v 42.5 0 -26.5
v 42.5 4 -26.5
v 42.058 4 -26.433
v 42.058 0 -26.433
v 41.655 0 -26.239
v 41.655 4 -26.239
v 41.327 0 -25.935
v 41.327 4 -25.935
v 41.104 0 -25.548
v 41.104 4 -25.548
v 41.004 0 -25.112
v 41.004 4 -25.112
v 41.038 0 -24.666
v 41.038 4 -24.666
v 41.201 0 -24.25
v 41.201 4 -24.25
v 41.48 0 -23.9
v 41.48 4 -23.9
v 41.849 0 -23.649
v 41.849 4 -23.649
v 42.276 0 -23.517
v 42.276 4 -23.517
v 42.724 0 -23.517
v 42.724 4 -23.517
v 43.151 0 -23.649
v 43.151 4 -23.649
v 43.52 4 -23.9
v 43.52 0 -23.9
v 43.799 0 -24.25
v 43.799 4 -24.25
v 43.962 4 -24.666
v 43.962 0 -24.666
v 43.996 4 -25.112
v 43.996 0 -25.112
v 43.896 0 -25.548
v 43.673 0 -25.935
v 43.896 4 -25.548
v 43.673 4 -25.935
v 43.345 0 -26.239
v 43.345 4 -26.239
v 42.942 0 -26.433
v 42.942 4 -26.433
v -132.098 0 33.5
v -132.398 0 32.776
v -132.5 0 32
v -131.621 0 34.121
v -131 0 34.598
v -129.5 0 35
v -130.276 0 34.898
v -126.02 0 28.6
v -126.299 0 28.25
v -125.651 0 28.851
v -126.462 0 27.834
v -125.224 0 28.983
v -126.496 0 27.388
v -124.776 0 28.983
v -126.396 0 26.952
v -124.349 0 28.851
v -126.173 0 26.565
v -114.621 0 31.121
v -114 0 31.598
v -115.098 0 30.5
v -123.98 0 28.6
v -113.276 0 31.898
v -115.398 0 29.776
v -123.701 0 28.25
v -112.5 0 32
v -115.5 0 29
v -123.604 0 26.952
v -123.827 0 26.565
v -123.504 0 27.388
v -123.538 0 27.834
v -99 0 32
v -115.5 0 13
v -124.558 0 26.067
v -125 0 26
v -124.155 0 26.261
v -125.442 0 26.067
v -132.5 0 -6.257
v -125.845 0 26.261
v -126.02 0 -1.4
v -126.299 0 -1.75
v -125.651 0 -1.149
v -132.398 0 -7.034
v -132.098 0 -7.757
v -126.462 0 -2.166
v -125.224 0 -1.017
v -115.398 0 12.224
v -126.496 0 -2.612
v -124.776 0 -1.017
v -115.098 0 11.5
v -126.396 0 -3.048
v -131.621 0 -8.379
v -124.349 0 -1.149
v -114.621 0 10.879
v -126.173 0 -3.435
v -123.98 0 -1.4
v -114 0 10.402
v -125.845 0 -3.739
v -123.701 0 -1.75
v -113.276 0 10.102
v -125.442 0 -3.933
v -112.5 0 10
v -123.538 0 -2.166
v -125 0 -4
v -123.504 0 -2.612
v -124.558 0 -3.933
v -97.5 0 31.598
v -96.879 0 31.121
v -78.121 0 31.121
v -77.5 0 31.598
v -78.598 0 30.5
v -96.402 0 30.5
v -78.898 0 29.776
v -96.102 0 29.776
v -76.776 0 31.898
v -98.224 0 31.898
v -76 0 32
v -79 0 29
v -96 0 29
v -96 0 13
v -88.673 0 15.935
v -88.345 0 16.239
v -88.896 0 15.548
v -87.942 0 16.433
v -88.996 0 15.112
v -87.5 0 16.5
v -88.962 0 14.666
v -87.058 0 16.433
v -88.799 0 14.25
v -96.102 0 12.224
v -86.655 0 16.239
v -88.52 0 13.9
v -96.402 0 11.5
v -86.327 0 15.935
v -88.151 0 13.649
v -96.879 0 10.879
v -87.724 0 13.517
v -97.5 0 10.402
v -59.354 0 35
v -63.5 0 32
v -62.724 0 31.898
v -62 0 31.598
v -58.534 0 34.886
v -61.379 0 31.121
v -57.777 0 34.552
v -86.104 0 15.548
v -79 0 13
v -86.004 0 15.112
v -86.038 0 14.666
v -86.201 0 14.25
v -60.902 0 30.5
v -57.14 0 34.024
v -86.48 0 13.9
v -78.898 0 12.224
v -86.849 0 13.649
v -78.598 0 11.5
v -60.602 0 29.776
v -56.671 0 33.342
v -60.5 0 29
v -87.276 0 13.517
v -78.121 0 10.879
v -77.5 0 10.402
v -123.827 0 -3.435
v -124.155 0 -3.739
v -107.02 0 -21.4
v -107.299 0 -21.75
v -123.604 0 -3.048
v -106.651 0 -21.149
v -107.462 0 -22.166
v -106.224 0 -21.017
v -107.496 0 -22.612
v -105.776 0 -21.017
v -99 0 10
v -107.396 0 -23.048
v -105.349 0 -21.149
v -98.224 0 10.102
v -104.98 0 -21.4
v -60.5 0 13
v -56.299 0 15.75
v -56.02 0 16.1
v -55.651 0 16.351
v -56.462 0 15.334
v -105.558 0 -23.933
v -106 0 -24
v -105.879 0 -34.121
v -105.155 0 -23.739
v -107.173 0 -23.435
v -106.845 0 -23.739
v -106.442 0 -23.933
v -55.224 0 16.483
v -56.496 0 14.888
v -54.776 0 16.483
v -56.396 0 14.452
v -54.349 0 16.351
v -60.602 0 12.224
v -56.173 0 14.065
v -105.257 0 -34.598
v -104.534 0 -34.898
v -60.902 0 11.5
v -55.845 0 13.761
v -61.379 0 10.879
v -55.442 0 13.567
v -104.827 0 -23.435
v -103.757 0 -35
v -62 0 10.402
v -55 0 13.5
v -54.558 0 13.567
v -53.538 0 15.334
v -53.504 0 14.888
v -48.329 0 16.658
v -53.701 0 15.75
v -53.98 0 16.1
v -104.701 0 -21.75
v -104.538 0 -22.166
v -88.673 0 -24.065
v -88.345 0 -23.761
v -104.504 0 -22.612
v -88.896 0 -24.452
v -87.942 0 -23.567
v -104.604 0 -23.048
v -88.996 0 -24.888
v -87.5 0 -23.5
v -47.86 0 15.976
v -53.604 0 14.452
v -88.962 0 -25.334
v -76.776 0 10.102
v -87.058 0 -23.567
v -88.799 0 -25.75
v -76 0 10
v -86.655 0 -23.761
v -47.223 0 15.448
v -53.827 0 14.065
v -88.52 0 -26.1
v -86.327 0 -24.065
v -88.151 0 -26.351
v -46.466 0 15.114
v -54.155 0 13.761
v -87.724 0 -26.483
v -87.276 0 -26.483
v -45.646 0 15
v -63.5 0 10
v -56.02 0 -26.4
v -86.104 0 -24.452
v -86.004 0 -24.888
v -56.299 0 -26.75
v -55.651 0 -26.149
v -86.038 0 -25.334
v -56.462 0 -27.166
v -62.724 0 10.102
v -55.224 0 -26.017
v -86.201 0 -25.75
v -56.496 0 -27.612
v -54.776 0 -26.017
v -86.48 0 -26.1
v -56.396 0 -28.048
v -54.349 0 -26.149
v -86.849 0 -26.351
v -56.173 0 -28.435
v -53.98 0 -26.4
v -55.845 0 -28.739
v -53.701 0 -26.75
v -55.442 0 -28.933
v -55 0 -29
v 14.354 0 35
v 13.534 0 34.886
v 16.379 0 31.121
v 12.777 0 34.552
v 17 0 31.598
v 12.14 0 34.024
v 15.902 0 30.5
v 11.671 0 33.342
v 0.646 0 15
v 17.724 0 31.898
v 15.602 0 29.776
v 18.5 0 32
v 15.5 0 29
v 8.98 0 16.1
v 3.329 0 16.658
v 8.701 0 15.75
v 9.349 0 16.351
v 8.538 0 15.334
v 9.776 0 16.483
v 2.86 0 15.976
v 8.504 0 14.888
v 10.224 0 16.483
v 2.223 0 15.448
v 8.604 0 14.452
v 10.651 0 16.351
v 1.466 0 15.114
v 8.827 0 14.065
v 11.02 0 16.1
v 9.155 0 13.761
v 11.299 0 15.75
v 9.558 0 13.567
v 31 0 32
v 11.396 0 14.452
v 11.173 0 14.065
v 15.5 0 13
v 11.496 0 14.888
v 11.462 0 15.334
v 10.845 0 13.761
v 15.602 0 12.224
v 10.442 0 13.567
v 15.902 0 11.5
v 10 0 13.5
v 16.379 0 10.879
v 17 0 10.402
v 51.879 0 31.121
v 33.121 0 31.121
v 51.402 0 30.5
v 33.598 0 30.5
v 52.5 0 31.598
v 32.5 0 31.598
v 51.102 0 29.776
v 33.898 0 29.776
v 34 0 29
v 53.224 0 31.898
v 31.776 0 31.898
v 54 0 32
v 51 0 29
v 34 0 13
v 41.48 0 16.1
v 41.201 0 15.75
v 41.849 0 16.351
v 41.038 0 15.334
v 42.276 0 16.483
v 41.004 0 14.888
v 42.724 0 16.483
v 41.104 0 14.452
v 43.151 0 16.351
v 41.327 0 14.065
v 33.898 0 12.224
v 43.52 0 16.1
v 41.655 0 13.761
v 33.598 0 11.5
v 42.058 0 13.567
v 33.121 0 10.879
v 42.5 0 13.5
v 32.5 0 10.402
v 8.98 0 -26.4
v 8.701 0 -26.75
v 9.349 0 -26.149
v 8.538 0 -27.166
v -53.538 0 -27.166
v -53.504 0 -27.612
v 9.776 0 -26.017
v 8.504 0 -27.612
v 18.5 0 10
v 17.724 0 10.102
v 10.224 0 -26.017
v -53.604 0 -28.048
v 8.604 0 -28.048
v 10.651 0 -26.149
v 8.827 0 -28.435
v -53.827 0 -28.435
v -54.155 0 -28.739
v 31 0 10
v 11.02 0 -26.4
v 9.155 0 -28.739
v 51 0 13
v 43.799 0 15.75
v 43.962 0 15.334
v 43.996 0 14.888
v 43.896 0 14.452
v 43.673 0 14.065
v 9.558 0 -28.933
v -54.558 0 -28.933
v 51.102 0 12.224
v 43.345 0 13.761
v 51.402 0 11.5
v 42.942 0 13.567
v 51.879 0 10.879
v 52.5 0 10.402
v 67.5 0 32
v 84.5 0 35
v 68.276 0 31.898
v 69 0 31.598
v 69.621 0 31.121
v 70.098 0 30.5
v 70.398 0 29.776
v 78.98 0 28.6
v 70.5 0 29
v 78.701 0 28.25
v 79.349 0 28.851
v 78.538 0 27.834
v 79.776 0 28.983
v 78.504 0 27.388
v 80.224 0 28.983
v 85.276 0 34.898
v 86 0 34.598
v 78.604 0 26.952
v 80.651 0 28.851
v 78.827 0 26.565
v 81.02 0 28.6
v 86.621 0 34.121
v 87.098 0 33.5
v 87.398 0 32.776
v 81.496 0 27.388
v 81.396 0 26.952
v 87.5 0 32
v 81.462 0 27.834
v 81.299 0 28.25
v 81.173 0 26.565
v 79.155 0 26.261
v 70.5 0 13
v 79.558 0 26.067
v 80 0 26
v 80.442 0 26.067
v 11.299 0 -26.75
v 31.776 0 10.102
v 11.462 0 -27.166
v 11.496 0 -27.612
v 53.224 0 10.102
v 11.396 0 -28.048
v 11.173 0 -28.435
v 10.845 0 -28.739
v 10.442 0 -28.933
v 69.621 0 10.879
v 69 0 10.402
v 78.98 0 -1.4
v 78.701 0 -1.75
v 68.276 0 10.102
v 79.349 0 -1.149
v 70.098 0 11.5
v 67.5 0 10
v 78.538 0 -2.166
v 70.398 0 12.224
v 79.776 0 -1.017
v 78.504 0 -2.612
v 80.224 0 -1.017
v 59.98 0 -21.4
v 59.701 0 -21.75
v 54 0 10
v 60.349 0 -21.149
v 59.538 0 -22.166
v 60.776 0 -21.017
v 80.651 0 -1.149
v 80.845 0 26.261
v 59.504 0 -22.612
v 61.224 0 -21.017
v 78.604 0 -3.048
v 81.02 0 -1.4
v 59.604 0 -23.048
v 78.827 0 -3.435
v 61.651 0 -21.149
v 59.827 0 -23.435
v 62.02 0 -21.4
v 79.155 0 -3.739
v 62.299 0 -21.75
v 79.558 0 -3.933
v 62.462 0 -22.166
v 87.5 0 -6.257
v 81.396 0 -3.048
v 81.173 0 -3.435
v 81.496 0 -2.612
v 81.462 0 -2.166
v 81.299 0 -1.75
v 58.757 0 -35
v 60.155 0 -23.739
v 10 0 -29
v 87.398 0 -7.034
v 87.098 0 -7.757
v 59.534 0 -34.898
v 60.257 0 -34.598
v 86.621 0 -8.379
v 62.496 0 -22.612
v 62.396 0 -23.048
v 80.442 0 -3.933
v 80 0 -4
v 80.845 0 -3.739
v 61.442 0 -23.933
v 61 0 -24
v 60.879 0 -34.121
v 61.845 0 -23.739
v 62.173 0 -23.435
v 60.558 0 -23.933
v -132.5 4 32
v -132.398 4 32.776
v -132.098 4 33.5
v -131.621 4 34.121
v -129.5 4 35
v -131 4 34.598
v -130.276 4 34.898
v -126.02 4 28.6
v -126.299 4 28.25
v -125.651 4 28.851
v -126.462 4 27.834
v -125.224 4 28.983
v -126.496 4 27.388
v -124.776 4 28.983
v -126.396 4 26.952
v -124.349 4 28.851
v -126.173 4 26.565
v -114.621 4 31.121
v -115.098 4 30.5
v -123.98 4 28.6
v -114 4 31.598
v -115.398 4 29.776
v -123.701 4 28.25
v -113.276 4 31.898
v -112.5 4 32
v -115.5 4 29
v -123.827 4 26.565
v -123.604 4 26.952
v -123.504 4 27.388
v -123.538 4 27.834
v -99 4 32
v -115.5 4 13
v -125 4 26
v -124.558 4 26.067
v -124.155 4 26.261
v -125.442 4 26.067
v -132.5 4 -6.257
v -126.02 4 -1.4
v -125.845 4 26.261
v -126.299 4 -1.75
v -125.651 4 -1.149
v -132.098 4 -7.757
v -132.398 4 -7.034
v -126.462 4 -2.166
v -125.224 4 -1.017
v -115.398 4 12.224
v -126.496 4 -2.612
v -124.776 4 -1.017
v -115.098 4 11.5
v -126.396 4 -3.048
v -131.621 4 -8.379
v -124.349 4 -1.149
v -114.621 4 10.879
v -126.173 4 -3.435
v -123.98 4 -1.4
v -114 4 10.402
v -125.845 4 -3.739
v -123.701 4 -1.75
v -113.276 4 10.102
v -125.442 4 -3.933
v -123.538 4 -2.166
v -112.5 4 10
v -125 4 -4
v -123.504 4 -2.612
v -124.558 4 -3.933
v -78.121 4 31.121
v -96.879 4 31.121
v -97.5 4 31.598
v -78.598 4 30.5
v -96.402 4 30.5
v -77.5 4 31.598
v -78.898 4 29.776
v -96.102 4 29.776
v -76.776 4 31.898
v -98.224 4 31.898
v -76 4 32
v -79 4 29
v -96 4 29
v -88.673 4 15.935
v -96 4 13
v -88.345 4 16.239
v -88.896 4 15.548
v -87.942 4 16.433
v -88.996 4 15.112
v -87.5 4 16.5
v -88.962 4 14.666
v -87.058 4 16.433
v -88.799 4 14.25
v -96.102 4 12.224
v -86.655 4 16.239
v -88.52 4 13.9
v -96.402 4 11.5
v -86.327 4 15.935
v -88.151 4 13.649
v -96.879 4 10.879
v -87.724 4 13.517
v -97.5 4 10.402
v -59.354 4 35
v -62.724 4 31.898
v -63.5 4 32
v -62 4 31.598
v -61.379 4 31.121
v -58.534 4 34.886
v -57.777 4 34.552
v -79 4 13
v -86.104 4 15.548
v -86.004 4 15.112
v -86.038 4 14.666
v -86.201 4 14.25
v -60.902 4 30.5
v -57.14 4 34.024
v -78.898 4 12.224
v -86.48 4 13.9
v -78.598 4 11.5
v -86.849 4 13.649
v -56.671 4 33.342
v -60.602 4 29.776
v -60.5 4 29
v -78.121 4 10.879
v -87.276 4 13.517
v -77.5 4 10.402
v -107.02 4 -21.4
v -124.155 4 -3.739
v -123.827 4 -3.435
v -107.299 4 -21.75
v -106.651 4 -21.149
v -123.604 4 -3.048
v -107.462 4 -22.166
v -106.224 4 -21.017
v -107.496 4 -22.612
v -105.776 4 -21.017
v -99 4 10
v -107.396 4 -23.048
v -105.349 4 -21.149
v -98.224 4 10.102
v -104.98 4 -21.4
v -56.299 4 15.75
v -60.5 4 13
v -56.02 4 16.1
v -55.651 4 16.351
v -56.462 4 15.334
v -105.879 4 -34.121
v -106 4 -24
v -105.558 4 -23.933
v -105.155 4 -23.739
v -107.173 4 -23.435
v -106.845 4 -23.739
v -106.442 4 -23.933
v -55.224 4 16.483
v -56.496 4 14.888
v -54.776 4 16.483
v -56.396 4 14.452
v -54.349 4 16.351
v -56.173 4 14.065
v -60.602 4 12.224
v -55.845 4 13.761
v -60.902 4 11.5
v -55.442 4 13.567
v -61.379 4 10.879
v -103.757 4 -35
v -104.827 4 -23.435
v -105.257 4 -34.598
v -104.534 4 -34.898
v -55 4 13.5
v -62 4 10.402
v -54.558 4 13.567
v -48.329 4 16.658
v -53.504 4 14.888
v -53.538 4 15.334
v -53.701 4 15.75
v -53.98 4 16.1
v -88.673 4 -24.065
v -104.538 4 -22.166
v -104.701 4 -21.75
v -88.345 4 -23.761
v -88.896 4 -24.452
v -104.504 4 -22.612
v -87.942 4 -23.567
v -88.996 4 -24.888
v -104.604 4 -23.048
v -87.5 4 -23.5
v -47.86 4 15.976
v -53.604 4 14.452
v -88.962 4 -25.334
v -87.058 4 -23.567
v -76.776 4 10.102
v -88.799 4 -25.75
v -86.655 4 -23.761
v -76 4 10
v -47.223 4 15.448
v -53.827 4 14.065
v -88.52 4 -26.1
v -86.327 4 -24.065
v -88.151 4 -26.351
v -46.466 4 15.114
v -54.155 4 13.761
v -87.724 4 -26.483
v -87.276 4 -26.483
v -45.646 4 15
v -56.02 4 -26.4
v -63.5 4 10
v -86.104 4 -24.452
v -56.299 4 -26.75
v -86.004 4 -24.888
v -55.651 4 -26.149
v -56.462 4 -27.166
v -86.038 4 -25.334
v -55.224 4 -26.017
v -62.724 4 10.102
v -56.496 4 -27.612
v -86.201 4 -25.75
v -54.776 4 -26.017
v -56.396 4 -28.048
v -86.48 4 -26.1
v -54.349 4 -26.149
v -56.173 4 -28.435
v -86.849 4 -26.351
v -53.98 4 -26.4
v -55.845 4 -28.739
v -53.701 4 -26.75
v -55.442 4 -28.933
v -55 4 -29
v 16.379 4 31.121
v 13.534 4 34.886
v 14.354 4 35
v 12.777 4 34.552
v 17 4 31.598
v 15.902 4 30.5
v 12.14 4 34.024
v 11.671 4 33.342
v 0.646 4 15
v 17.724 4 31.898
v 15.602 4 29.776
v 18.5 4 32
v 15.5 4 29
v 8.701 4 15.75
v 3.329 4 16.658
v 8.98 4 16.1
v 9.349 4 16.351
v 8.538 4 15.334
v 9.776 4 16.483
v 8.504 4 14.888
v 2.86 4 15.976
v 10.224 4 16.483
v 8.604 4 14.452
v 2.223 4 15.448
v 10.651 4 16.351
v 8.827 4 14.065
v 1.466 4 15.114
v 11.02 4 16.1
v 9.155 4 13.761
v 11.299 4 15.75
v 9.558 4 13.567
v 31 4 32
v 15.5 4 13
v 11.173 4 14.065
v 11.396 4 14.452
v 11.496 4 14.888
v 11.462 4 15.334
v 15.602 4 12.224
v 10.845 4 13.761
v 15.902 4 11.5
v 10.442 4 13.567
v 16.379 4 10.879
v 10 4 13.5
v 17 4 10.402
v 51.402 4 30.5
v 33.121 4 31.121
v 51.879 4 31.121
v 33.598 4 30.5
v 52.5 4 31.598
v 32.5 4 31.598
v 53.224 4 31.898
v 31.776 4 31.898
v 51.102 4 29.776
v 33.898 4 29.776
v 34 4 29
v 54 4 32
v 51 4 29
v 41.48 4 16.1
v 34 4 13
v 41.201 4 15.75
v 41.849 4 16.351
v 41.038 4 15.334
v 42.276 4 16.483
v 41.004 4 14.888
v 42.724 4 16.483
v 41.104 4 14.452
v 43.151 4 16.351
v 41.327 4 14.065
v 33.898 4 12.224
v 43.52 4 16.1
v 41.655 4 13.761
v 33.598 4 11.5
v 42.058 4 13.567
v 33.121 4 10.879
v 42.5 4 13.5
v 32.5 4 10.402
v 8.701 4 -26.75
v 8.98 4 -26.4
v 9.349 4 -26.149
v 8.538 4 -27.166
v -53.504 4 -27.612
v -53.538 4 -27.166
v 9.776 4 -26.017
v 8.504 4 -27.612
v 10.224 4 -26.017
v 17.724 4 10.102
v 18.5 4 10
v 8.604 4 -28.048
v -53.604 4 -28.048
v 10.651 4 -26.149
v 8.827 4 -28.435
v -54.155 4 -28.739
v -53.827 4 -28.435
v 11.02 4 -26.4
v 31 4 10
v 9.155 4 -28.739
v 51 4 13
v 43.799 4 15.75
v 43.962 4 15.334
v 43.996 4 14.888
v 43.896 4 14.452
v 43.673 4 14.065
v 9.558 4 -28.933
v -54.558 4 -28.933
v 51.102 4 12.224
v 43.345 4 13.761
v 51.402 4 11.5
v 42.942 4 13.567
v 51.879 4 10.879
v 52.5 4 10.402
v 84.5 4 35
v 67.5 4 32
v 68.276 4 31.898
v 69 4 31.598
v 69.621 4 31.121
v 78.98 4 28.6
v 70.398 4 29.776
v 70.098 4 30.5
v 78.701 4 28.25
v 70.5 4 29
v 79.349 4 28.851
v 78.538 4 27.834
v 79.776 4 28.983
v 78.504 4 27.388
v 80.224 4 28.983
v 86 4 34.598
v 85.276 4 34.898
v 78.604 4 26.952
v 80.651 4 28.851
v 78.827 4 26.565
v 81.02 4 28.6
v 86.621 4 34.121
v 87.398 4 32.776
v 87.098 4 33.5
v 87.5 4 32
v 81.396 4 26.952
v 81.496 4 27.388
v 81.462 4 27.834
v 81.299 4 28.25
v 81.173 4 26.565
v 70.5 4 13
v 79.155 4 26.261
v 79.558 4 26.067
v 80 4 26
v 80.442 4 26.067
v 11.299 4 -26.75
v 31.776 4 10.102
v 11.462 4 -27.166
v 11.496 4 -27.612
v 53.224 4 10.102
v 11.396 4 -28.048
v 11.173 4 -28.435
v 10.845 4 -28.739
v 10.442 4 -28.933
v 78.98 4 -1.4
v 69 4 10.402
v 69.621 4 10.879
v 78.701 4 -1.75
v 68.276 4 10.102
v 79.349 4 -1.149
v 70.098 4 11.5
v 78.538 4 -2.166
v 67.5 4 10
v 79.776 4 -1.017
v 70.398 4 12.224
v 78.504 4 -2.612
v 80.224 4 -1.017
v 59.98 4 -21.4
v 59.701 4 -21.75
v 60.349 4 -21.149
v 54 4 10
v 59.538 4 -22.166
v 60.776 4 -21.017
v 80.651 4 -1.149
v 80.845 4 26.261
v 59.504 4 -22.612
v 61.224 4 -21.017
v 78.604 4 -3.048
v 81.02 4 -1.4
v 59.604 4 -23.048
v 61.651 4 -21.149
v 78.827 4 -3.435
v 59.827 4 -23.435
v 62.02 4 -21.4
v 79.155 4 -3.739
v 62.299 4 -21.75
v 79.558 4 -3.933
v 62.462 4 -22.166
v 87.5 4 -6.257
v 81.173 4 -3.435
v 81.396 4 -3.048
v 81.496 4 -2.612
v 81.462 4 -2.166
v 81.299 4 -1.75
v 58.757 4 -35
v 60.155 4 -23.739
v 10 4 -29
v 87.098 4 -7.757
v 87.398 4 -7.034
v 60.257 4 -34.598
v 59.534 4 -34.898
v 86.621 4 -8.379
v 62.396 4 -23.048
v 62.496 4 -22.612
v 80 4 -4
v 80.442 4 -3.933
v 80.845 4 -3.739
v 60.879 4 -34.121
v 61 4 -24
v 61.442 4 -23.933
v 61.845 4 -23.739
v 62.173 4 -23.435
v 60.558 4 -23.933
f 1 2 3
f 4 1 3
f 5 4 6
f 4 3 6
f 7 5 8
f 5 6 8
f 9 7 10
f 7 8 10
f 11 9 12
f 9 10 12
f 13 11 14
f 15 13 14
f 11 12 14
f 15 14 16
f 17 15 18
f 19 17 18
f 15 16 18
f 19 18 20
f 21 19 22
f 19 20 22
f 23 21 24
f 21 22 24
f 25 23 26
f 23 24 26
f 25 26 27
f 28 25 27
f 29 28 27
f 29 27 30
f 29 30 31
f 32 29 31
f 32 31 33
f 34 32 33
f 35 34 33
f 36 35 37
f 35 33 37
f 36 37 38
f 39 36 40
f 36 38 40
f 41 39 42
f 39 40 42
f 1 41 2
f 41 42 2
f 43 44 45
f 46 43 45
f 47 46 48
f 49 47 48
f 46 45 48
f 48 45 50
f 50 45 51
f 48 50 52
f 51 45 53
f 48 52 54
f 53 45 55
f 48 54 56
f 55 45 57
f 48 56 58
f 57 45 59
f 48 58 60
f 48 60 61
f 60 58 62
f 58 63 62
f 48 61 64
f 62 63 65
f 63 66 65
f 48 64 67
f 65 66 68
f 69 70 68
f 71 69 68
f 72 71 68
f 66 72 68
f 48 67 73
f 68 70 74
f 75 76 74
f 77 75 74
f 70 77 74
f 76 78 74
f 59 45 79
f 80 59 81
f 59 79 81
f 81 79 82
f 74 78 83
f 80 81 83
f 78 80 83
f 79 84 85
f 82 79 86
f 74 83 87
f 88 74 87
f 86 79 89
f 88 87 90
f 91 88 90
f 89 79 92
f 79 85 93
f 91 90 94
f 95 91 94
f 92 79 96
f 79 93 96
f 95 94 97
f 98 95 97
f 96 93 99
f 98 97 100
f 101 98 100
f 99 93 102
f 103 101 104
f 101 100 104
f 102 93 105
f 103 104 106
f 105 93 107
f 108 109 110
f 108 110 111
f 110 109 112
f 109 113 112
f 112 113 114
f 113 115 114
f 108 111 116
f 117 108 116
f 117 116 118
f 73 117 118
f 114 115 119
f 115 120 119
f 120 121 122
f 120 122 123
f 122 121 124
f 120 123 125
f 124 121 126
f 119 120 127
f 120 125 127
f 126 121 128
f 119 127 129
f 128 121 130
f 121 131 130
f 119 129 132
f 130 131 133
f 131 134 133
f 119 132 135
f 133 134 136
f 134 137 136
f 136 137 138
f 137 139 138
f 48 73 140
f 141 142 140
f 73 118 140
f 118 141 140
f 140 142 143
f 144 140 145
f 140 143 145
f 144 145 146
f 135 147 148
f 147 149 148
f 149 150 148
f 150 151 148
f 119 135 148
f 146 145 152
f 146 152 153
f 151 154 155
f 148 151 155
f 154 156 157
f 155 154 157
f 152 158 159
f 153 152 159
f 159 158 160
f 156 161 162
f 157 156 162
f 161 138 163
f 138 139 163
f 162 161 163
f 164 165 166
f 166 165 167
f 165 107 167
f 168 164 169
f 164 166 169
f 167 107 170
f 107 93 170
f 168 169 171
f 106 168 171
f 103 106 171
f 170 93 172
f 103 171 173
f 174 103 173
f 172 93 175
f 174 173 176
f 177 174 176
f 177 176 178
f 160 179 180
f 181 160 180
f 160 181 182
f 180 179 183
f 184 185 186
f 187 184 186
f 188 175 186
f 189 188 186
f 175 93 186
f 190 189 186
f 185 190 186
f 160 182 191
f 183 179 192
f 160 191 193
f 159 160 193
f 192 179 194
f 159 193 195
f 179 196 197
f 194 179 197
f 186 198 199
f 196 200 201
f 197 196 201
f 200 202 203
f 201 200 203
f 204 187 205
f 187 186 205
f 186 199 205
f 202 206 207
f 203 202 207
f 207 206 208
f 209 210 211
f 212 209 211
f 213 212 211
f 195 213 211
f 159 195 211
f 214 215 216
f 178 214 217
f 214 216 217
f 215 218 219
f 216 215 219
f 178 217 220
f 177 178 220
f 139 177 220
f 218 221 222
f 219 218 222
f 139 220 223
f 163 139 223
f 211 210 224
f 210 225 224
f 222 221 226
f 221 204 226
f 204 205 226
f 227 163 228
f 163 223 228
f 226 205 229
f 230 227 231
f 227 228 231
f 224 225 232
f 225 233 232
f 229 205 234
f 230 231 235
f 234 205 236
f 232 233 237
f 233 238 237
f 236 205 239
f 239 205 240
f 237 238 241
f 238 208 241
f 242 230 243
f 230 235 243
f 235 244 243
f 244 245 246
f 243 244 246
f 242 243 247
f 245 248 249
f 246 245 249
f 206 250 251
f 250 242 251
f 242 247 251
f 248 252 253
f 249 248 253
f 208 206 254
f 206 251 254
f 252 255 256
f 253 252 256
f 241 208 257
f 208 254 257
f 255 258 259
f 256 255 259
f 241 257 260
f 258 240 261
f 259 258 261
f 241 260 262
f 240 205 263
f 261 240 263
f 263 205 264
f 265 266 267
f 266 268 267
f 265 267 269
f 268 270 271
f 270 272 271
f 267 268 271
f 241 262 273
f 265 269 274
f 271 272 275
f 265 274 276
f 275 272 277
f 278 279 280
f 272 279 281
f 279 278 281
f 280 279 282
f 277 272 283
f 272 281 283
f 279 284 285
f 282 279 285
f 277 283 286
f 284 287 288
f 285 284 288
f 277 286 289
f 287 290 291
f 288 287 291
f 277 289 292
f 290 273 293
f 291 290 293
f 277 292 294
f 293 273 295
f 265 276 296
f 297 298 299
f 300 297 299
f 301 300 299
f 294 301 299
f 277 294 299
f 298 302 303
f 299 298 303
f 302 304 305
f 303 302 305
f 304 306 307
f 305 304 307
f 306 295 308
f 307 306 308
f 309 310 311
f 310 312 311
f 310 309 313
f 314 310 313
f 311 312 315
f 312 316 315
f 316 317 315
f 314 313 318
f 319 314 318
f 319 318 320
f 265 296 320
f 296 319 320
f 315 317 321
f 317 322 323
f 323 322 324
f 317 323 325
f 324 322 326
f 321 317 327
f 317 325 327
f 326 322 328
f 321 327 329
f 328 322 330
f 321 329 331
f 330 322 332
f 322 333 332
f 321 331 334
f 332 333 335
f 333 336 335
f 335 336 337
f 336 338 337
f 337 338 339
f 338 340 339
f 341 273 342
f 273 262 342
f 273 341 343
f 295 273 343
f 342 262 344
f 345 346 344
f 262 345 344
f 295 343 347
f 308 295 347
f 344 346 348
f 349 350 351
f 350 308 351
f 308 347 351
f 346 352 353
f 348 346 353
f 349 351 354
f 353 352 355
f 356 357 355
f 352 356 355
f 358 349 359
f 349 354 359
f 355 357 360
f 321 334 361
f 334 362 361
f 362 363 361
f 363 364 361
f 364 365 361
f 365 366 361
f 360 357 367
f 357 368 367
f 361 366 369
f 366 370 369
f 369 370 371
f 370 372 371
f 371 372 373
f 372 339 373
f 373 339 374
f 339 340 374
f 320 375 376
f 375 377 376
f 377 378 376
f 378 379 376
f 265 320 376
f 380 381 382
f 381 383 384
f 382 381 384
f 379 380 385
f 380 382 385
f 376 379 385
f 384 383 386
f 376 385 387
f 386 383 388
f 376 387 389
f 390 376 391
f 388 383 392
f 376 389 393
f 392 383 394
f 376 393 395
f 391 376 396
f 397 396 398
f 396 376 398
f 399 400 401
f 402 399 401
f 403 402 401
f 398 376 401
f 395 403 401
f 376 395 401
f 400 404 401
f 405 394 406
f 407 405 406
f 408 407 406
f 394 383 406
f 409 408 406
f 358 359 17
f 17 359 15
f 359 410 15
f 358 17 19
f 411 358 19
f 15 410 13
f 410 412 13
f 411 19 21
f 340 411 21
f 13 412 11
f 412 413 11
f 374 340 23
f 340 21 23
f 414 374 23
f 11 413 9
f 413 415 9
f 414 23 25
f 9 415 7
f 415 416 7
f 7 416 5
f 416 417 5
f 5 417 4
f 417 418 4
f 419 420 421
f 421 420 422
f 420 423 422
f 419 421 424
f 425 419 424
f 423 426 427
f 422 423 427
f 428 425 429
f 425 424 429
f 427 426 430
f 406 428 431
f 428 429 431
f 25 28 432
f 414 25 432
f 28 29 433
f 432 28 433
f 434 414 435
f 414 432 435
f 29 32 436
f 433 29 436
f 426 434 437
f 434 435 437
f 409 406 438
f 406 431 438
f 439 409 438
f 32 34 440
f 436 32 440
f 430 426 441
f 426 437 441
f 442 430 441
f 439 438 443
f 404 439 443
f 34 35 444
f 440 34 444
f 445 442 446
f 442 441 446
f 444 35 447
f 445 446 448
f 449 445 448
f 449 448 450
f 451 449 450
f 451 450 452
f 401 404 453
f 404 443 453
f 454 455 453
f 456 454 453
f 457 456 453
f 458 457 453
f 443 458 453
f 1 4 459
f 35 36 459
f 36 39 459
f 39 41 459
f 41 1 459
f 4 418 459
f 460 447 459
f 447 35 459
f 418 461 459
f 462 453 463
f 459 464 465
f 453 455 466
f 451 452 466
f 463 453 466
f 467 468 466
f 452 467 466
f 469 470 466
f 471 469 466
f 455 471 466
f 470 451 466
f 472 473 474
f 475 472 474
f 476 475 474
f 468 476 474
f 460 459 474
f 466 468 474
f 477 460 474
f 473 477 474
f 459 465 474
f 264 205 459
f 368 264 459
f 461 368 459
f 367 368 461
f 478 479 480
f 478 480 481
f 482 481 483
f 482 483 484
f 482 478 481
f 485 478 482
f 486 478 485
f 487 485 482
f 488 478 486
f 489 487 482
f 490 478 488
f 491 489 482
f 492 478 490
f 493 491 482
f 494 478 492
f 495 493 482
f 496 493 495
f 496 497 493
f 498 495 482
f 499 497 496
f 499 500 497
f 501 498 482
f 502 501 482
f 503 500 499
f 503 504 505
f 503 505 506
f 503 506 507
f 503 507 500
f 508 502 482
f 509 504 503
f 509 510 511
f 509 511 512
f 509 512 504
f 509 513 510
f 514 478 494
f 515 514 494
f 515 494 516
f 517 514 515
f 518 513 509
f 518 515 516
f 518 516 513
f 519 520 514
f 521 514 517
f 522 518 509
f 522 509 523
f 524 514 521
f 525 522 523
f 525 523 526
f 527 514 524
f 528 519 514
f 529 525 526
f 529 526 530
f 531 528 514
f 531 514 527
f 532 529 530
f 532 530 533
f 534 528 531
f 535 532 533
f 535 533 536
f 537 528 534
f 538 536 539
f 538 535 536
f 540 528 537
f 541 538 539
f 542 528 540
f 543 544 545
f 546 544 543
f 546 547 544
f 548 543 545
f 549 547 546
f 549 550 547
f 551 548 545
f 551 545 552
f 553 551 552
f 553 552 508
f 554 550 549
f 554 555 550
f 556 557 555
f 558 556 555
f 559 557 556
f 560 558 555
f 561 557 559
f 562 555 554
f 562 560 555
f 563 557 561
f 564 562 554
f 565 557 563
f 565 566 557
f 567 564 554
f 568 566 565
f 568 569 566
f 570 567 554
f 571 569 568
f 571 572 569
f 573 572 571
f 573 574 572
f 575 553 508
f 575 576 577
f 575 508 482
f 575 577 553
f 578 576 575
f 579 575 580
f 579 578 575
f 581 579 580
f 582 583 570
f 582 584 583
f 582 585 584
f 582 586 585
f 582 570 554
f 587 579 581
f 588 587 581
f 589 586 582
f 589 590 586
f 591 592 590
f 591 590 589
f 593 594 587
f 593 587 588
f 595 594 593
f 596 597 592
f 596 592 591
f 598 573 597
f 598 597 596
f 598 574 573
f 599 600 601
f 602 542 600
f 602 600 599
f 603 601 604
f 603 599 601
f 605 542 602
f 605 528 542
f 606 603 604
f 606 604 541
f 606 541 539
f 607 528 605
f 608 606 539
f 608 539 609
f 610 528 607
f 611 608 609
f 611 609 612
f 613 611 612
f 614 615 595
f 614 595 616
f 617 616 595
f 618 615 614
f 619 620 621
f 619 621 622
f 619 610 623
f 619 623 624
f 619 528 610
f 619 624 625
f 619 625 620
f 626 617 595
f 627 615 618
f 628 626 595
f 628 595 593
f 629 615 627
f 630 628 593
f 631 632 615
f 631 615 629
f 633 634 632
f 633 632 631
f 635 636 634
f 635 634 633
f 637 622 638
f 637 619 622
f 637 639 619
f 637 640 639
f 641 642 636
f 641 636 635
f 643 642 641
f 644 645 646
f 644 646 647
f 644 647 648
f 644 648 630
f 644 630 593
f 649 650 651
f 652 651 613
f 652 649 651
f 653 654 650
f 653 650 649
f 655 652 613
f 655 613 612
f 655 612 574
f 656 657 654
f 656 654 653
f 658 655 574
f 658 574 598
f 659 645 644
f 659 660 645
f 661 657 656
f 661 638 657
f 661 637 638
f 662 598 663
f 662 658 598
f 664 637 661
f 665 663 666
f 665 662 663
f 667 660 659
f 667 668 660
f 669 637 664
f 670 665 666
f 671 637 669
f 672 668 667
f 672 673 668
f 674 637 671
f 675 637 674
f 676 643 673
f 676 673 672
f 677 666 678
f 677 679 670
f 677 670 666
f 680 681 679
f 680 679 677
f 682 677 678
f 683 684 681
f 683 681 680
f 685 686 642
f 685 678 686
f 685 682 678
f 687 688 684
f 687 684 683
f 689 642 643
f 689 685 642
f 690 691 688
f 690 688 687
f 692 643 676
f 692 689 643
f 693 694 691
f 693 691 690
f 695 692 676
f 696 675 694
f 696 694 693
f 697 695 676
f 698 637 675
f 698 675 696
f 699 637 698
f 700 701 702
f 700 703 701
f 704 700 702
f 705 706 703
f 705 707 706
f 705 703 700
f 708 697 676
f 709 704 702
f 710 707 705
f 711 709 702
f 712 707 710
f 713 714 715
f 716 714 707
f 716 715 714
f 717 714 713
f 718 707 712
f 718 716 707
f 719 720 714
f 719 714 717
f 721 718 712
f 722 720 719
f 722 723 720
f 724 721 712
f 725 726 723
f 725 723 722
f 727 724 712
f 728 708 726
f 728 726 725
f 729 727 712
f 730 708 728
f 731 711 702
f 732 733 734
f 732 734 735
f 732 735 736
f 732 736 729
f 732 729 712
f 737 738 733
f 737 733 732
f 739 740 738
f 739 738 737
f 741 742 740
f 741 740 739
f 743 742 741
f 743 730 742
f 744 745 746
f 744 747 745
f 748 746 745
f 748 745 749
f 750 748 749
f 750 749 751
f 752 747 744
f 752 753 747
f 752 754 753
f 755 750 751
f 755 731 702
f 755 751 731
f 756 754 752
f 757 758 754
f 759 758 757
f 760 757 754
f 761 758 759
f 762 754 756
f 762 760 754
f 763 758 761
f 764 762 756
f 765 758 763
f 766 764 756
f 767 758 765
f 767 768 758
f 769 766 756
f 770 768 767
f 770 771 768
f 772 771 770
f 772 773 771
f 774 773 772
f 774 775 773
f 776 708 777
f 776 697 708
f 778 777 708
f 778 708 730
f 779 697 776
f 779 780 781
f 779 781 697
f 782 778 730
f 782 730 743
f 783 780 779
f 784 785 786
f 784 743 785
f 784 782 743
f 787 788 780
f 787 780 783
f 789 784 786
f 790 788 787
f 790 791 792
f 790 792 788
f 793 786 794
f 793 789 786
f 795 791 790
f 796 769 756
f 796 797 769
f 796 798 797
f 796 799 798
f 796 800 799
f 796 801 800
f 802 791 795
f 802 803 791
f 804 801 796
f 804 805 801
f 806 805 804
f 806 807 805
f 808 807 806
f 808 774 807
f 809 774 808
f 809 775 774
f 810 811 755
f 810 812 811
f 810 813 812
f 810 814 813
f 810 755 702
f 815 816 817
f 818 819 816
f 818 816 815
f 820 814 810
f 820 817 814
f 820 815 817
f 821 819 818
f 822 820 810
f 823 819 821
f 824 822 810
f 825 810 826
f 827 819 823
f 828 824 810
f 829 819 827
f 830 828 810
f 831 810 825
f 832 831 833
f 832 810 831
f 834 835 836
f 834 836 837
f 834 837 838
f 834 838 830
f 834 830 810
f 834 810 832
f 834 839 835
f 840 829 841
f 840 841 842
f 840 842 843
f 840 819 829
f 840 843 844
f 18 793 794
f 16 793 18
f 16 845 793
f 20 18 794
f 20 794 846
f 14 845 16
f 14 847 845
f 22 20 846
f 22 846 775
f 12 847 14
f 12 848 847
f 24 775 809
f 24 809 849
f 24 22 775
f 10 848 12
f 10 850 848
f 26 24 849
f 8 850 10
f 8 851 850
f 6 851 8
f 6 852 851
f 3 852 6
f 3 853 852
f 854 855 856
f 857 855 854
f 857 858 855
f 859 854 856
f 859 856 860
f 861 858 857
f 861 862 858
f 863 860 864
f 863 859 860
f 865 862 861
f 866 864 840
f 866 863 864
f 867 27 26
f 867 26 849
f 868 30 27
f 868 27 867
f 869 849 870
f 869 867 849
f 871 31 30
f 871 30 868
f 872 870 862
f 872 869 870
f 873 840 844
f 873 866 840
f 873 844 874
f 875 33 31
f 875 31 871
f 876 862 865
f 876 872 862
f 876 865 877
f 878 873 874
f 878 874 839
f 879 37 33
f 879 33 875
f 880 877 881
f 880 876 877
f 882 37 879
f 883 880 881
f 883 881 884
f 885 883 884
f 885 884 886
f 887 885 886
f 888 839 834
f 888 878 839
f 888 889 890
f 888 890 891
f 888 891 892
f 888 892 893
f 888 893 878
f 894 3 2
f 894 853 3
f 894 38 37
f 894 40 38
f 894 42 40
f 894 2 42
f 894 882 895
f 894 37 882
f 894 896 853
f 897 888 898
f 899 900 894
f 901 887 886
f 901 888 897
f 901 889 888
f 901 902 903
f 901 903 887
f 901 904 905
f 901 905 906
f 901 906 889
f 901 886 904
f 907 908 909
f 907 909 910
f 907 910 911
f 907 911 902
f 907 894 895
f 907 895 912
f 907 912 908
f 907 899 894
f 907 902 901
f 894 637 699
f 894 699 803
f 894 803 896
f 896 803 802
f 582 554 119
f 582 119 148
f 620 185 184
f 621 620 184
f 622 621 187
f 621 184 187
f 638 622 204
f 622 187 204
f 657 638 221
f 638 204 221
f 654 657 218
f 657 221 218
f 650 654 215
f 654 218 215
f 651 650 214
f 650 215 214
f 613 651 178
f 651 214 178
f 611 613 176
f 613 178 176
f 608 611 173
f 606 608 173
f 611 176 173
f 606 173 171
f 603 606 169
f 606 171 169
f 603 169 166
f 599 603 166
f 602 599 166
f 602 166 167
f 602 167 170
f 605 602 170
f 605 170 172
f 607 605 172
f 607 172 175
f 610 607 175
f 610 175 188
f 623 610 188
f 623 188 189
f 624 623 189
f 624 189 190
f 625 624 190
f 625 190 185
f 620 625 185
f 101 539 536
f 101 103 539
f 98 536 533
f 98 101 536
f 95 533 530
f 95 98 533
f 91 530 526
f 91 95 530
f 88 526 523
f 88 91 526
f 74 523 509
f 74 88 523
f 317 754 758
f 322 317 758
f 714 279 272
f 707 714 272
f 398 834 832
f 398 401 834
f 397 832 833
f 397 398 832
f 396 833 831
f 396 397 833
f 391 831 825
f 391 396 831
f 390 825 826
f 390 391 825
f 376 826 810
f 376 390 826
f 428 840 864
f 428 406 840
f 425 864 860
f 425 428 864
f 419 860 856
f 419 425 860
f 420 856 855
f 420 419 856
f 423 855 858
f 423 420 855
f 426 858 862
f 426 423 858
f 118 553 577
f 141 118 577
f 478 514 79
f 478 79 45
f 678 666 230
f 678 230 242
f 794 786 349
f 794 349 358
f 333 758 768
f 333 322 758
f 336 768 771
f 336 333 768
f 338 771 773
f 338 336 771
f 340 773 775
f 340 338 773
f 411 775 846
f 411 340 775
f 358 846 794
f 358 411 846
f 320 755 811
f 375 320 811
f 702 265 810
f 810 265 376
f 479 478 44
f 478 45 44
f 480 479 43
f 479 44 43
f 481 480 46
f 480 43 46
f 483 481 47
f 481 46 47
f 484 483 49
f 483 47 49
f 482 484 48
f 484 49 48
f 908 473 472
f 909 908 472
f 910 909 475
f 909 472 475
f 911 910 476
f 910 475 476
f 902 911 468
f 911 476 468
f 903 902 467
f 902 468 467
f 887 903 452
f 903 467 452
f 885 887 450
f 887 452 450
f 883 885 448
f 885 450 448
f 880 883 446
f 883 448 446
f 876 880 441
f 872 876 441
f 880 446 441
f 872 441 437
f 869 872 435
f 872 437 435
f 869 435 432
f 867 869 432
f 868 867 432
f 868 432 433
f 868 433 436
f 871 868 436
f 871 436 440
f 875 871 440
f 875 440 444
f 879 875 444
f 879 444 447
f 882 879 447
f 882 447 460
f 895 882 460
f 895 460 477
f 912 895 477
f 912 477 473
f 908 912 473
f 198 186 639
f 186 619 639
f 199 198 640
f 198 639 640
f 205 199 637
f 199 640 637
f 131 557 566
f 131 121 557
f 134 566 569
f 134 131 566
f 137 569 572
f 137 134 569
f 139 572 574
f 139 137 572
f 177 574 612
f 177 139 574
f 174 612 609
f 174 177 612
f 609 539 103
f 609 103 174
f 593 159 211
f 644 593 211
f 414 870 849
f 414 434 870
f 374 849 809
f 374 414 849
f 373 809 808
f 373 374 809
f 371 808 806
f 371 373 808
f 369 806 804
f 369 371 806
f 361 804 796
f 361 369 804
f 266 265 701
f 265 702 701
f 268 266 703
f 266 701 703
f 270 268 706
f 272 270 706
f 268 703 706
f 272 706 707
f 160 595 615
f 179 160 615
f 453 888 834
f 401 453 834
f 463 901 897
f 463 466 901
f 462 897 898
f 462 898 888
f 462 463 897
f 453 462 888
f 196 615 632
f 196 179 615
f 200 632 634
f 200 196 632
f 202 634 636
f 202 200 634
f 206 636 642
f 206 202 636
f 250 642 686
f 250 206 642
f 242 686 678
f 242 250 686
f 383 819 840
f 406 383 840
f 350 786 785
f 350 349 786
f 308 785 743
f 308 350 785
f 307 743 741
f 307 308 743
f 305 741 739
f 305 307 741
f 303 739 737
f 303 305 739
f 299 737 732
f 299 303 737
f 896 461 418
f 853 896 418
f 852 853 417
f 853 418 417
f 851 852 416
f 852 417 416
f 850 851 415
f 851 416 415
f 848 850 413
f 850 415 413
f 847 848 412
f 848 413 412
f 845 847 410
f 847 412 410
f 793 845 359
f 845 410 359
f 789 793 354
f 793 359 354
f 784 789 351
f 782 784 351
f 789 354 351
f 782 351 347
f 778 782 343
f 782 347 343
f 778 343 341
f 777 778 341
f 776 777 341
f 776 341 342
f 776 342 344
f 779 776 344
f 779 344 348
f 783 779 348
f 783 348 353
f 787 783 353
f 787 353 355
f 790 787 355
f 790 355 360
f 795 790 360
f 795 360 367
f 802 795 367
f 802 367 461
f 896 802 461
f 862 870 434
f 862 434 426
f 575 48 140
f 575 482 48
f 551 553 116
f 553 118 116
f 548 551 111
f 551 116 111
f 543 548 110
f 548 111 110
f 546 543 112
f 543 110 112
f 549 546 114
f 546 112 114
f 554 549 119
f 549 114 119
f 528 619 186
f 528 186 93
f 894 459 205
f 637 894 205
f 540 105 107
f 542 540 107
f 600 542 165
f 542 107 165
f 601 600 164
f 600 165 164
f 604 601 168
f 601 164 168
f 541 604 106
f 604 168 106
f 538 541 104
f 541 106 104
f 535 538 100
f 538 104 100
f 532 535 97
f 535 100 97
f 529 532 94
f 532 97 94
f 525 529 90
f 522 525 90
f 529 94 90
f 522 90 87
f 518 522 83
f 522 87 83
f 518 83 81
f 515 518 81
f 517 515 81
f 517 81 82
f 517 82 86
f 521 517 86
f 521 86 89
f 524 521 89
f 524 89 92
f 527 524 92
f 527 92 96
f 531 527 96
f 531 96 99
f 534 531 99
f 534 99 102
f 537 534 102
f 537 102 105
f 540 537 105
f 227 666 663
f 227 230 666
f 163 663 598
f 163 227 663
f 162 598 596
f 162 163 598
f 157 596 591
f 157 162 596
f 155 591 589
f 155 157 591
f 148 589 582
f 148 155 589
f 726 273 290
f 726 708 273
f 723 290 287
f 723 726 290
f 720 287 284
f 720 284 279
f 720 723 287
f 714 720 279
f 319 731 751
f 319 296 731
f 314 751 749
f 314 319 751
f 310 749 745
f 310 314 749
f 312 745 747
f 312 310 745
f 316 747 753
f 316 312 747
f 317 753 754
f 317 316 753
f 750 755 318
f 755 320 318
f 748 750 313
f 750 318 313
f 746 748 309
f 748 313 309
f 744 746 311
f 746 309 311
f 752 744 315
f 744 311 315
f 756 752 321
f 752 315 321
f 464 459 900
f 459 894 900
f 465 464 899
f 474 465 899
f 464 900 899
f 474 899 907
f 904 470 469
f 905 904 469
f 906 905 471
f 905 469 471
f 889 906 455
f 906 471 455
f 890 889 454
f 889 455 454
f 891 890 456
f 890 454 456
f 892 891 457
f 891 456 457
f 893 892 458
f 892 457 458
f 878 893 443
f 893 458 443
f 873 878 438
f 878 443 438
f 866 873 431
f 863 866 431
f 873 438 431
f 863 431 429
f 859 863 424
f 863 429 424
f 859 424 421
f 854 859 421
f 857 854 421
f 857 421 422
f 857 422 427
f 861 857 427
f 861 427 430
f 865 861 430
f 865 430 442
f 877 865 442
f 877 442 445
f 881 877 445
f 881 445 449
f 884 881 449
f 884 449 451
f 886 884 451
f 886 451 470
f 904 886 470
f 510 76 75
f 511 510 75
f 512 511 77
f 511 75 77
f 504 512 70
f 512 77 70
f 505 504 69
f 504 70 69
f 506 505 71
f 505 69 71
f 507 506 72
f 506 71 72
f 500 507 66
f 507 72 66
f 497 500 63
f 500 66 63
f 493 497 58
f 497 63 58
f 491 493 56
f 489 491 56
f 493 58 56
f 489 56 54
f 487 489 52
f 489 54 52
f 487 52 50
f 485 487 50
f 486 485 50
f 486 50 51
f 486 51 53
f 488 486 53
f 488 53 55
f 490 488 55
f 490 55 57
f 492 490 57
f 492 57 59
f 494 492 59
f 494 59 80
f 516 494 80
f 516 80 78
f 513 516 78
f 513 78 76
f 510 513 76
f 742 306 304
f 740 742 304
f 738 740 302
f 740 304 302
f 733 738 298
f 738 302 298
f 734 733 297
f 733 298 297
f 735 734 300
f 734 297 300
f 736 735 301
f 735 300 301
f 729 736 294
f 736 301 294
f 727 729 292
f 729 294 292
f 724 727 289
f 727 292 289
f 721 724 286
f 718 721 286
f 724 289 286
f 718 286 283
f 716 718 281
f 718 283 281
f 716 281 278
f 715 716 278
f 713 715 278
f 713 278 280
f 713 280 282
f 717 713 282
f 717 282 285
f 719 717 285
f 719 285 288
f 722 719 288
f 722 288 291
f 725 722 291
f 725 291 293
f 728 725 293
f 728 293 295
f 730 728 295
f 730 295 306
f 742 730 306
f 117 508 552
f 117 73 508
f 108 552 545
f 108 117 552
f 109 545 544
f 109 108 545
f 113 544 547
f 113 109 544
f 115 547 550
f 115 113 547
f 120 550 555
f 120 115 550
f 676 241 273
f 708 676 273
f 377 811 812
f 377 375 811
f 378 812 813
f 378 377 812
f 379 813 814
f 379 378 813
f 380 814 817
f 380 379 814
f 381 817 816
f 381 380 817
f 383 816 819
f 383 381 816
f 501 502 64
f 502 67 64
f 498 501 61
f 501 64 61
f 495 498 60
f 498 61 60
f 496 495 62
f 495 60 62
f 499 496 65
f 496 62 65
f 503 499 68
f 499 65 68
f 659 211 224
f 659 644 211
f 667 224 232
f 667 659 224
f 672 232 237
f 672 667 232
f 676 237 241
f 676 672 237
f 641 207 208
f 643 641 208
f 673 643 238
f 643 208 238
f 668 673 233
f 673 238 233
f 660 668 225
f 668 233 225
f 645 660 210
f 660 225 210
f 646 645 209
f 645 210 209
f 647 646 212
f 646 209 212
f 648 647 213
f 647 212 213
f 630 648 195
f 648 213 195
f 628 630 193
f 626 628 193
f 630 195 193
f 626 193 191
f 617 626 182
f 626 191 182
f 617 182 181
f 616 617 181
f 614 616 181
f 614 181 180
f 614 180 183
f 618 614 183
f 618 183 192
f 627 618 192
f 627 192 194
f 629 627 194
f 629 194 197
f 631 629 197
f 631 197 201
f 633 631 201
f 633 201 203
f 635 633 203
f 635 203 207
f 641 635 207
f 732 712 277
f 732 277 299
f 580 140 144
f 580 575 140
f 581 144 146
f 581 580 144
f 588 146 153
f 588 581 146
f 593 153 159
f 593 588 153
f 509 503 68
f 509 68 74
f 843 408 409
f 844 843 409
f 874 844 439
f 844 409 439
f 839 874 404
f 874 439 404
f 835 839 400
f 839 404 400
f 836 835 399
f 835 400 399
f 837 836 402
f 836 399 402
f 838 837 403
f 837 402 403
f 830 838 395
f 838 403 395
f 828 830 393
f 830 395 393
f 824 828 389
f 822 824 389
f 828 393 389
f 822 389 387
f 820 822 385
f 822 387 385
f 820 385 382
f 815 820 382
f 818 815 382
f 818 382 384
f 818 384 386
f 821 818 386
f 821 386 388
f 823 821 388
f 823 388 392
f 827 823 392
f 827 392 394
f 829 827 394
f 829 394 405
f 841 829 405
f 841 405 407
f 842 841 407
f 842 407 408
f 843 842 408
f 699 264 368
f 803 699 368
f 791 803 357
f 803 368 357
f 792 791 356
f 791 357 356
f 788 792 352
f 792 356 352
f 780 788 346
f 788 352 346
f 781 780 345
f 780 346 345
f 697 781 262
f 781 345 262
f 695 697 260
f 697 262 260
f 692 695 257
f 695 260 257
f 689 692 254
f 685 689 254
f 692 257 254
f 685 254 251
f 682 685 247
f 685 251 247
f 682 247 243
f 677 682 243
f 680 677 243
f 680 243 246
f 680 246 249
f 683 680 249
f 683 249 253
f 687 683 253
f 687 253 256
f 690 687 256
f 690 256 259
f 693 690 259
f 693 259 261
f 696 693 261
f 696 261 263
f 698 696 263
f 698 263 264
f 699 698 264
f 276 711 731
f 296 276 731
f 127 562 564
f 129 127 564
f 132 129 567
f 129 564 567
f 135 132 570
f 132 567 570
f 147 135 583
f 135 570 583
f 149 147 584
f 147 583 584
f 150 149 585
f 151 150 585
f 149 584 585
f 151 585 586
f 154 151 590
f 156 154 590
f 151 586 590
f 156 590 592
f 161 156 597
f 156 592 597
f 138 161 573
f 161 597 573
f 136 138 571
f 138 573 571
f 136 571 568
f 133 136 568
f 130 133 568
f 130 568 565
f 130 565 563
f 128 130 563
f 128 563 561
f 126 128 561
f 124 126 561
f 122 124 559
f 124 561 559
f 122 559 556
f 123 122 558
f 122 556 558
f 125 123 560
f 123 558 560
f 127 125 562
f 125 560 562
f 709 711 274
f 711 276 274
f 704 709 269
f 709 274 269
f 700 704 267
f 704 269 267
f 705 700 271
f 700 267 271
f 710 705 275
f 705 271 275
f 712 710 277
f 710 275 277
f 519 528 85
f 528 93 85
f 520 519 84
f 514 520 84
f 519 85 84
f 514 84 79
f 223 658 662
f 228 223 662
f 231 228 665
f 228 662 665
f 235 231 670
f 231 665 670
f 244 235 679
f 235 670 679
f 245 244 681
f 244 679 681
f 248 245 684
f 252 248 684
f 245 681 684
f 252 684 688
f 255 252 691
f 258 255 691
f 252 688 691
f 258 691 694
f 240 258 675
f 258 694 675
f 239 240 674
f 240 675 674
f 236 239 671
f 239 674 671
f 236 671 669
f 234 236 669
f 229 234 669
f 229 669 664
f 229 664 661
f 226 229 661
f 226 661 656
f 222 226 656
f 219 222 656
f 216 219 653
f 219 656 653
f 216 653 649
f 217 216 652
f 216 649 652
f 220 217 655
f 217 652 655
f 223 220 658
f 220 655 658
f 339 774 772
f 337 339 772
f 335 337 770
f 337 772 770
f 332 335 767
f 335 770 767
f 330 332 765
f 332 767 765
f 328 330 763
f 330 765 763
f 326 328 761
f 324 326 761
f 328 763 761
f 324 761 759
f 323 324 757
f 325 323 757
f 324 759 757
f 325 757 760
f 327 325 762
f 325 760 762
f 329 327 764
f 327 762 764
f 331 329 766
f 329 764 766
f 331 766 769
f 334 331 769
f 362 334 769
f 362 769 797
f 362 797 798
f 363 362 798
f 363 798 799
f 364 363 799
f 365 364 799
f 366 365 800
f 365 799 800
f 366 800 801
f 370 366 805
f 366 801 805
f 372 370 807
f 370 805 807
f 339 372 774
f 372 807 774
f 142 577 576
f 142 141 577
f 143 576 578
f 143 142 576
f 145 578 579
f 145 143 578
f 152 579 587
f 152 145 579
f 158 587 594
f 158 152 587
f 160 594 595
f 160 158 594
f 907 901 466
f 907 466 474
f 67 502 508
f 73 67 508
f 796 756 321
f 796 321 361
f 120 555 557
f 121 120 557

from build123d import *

# Parameters (mm, degrees)
EXTRUDE_1_DEPTH     = 4
SKETCH_2_R          = 1.5
CUT_EXTRUDE_1_DEPTH = 4
SKETCH_3_W          = 10
SKETCH_3_H          = 69.678883607
SKETCH_3_H_2        = 93.047687854
CUT_EXTRUDE_2_DEPTH = 4
CUT_EXTRUDE_3_DEPTH = 4
EXTRUDE_2_DEPTH     = 4
SKETCH_6_R          = 1.5
CUT_EXTRUDE_4_DEPTH = 10
SKETCH_7_W          = 19.5
SKETCH_7_H          = 22
SKETCH_7_W_2        = 18.5
CUT_EXTRUDE_5_DEPTH = 10
FILLET_1_R          = 3
FILLET_2_R          = 3
FILLET_3_R          = 3
SKETCH_8_R          = 1.5
CUT_EXTRUDE_6_DEPTH = 10


with BuildPart() as part:
    # 草图1 → 凸台-拉伸1 (new body)
    with BuildSketch(Plane(origin=(0, 0, 0), x_dir=(1, 0, 0), z_dir=(0, 1, 0))):
        Polygon((-137.5, -35), (-67.5, -35), (-57.5, -35), (-47.5, -15), (2.5, -15), (12.5, -35), (22.5, -35), (92.5, -35), (92.5, 15), (72.5, 35), (-117.5, 35), (-137.5, 15), align=None)
    extrude(amount=EXTRUDE_1_DEPTH)

    # 草图2 → 切除-拉伸1 (cut)
    with BuildSketch(Plane(origin=(0, 4, 0), x_dir=(1, 0, 0), z_dir=(0, 1, 0))):
        with Locations(Location((-87.5, -15, 0), (0, 0, 270))):
            Circle(SKETCH_2_R)
        with Locations(Location((-87.5, 25, 0), (0, 0, 270))):
            Circle(SKETCH_2_R)
        with Locations(Location((42.5, 25, 0), (0, 0, 90))):
            Circle(SKETCH_2_R)
        with Locations(Location((42.5, -15, 0), (0, 0, 90))):
            Circle(SKETCH_2_R)
    extrude(amount=-CUT_EXTRUDE_1_DEPTH, mode=Mode.SUBTRACT)

    # 草图3 → 切除-拉伸2 (cut)
    with BuildSketch(Plane(origin=(0, 4, 0), x_dir=(1, 0, 0), z_dir=(0, 1, 0))):
        with Locations((-132.5, -0.160558196)):
            Rectangle(SKETCH_3_W, SKETCH_3_H)
        with Locations((87.5, 11.523843927)):
            Rectangle(SKETCH_3_W, SKETCH_3_H_2)
    extrude(amount=-CUT_EXTRUDE_2_DEPTH, mode=Mode.SUBTRACT)

    # 草图4 → 切除-拉伸3 (cut)
    with BuildSketch(Plane(origin=(0, 4, 0), x_dir=(1, 0, 0), z_dir=(0, 1, 0))):
        Polygon((-127.5, 12.5), (-92.197077218, 47.802922782), (-150.178982695, 47.802922782), align=None)
        Polygon((82.5, 12.5), (37.005283765, 57.994716235), (96.544114713, 56.205234398), align=None)
    extrude(amount=-CUT_EXTRUDE_3_DEPTH, mode=Mode.SUBTRACT)

    # 草图5 → 凸台-拉伸2 (add)
    with BuildSketch(Plane(origin=(0, 4, 0), x_dir=(1, 0, 0), z_dir=(0, 1, 0))):
        Polygon((-127.5, 12.5), (-132.5, 7.5), (-132.5, -35), (-127.5, -35), align=None)
        Polygon((82.5, -35), (82.5, 12.5), (87.5, 7.5), (87.5, -35), align=None)
    extrude(amount=-EXTRUDE_2_DEPTH)

    # 草图6 → 切除-拉伸4 (cut)
    with BuildSketch(Plane(origin=(0, 4, 0), x_dir=(1, 0, 0), z_dir=(0, 1, 0))):
        with Locations(Location((59.5, -29, 0), (0, 0, 270))):
            Circle(SKETCH_6_R)
        with Locations(Location((59.5, -19, 0), (0, 0, 270))):
            Circle(SKETCH_6_R)
        with Locations(Location((23.5, -19, 0), (0, 0, 270))):
            Circle(SKETCH_6_R)
        with Locations(Location((23.5, -29, 0), (0, 0, 270))):
            Circle(SKETCH_6_R)
        with Locations(Location((-68.5, -29, 0), (0, 0, 90))):
            Circle(SKETCH_6_R)
        with Locations(Location((-68.5, -19, 0), (0, 0, 90))):
            Circle(SKETCH_6_R)
        with Locations(Location((-104.5, -19, 0), (0, 0, 90))):
            Circle(SKETCH_6_R)
        with Locations(Location((-104.5, -29, 0), (0, 0, 90))):
            Circle(SKETCH_6_R)
    extrude(amount=-CUT_EXTRUDE_4_DEPTH, mode=Mode.SUBTRACT)

    # 草图7 → 切除-拉伸5 (cut)
    with BuildSketch(Plane(origin=(0, 4, 0), x_dir=(1, 0, 0), z_dir=(0, 1, 0))):
        with Locations((-105.75, -21)):
            Rectangle(SKETCH_7_W, SKETCH_7_H)
        with Locations((-69.75, -21)):
            Rectangle(SKETCH_7_W_2, SKETCH_7_H)
        with Locations((24.75, -21)):
            Rectangle(SKETCH_7_W_2, SKETCH_7_H)
        with Locations((60.75, -21)):
            Rectangle(SKETCH_7_W, SKETCH_7_H)
    extrude(amount=-CUT_EXTRUDE_5_DEPTH, mode=Mode.SUBTRACT)

    # 圆角1
    fillet_1_edges = [part.edges().sort_by_distance(p)[0] for p in [
        (-115.5, 2, 32),
        (-115.5, 2, 10),
        (-96, 2, 10),
        (-96, 2, 32),
        (-79, 2, 32),
        (-79, 2, 10),
        (-60.5, 2, 10),
        (-60.5, 2, 32),
    ]]
    fillet(fillet_1_edges, radius=FILLET_1_R)

    # 圆角2
    fillet_2_edges = [part.edges().sort_by_distance(p)[0] for p in [
        (15.5, 2, 10),
        (34, 2, 10),
        (34, 2, 32),
        (15.5, 2, 32),
        (51, 2, 10),
        (70.5, 2, 10),
        (70.5, 2, 32),
        (51, 2, 32),
    ]]
    fillet(fillet_2_edges, radius=FILLET_2_R)

    # 圆角3
    fillet_3_edges = [part.edges().sort_by_distance(p)[0] for p in [
        (60, 2, -35),
        (-132.5, 2, -7.5),
        (-132.5, 2, 35),
        (87.5, 2, -7.5),
        (87.5, 2, 35),
        (12.5, 2, 35),
        (2.5, 2, 15),
        (-47.5, 2, 15),
        (-57.5, 2, 35),
        (-105, 2, -35),
    ]]
    fillet(fillet_3_edges, radius=FILLET_3_R)

    # 草图8 → 切除-拉伸6 (cut)
    with BuildSketch(Plane.XZ):
        with Locations(Location((-125, 27.5, 0), (0, 0, 270))):
            Circle(SKETCH_8_R)
        with Locations(Location((-125, -2.5, 0), (0, 0, 270))):
            Circle(SKETCH_8_R)
        with Locations(Location((-55, 15, 0), (0, 0, 270))):
            Circle(SKETCH_8_R)
        with Locations(Location((-55, -27.5, 0), (0, 0, 270))):
            Circle(SKETCH_8_R)
        with Locations(Location((10, -27.5, 0), (0, 0, 270))):
            Circle(SKETCH_8_R)
        with Locations(Location((10, 15, 0), (0, 0, 270))):
            Circle(SKETCH_8_R)
        with Locations(Location((80, -2.5, 0), (0, 0, 270))):
            Circle(SKETCH_8_R)
        with Locations(Location((80, 27.5, 0), (0, 0, 270))):
            Circle(SKETCH_8_R)
        with Locations(Location((-106, -22.5, 0), (0, 0, 270))):
            Circle(SKETCH_8_R)
        with Locations(Location((61, -22.5, 0), (0, 0, 270))):
            Circle(SKETCH_8_R)
    extrude(amount=-CUT_EXTRUDE_6_DEPTH, mode=Mode.SUBTRACT)


solid = part.part
